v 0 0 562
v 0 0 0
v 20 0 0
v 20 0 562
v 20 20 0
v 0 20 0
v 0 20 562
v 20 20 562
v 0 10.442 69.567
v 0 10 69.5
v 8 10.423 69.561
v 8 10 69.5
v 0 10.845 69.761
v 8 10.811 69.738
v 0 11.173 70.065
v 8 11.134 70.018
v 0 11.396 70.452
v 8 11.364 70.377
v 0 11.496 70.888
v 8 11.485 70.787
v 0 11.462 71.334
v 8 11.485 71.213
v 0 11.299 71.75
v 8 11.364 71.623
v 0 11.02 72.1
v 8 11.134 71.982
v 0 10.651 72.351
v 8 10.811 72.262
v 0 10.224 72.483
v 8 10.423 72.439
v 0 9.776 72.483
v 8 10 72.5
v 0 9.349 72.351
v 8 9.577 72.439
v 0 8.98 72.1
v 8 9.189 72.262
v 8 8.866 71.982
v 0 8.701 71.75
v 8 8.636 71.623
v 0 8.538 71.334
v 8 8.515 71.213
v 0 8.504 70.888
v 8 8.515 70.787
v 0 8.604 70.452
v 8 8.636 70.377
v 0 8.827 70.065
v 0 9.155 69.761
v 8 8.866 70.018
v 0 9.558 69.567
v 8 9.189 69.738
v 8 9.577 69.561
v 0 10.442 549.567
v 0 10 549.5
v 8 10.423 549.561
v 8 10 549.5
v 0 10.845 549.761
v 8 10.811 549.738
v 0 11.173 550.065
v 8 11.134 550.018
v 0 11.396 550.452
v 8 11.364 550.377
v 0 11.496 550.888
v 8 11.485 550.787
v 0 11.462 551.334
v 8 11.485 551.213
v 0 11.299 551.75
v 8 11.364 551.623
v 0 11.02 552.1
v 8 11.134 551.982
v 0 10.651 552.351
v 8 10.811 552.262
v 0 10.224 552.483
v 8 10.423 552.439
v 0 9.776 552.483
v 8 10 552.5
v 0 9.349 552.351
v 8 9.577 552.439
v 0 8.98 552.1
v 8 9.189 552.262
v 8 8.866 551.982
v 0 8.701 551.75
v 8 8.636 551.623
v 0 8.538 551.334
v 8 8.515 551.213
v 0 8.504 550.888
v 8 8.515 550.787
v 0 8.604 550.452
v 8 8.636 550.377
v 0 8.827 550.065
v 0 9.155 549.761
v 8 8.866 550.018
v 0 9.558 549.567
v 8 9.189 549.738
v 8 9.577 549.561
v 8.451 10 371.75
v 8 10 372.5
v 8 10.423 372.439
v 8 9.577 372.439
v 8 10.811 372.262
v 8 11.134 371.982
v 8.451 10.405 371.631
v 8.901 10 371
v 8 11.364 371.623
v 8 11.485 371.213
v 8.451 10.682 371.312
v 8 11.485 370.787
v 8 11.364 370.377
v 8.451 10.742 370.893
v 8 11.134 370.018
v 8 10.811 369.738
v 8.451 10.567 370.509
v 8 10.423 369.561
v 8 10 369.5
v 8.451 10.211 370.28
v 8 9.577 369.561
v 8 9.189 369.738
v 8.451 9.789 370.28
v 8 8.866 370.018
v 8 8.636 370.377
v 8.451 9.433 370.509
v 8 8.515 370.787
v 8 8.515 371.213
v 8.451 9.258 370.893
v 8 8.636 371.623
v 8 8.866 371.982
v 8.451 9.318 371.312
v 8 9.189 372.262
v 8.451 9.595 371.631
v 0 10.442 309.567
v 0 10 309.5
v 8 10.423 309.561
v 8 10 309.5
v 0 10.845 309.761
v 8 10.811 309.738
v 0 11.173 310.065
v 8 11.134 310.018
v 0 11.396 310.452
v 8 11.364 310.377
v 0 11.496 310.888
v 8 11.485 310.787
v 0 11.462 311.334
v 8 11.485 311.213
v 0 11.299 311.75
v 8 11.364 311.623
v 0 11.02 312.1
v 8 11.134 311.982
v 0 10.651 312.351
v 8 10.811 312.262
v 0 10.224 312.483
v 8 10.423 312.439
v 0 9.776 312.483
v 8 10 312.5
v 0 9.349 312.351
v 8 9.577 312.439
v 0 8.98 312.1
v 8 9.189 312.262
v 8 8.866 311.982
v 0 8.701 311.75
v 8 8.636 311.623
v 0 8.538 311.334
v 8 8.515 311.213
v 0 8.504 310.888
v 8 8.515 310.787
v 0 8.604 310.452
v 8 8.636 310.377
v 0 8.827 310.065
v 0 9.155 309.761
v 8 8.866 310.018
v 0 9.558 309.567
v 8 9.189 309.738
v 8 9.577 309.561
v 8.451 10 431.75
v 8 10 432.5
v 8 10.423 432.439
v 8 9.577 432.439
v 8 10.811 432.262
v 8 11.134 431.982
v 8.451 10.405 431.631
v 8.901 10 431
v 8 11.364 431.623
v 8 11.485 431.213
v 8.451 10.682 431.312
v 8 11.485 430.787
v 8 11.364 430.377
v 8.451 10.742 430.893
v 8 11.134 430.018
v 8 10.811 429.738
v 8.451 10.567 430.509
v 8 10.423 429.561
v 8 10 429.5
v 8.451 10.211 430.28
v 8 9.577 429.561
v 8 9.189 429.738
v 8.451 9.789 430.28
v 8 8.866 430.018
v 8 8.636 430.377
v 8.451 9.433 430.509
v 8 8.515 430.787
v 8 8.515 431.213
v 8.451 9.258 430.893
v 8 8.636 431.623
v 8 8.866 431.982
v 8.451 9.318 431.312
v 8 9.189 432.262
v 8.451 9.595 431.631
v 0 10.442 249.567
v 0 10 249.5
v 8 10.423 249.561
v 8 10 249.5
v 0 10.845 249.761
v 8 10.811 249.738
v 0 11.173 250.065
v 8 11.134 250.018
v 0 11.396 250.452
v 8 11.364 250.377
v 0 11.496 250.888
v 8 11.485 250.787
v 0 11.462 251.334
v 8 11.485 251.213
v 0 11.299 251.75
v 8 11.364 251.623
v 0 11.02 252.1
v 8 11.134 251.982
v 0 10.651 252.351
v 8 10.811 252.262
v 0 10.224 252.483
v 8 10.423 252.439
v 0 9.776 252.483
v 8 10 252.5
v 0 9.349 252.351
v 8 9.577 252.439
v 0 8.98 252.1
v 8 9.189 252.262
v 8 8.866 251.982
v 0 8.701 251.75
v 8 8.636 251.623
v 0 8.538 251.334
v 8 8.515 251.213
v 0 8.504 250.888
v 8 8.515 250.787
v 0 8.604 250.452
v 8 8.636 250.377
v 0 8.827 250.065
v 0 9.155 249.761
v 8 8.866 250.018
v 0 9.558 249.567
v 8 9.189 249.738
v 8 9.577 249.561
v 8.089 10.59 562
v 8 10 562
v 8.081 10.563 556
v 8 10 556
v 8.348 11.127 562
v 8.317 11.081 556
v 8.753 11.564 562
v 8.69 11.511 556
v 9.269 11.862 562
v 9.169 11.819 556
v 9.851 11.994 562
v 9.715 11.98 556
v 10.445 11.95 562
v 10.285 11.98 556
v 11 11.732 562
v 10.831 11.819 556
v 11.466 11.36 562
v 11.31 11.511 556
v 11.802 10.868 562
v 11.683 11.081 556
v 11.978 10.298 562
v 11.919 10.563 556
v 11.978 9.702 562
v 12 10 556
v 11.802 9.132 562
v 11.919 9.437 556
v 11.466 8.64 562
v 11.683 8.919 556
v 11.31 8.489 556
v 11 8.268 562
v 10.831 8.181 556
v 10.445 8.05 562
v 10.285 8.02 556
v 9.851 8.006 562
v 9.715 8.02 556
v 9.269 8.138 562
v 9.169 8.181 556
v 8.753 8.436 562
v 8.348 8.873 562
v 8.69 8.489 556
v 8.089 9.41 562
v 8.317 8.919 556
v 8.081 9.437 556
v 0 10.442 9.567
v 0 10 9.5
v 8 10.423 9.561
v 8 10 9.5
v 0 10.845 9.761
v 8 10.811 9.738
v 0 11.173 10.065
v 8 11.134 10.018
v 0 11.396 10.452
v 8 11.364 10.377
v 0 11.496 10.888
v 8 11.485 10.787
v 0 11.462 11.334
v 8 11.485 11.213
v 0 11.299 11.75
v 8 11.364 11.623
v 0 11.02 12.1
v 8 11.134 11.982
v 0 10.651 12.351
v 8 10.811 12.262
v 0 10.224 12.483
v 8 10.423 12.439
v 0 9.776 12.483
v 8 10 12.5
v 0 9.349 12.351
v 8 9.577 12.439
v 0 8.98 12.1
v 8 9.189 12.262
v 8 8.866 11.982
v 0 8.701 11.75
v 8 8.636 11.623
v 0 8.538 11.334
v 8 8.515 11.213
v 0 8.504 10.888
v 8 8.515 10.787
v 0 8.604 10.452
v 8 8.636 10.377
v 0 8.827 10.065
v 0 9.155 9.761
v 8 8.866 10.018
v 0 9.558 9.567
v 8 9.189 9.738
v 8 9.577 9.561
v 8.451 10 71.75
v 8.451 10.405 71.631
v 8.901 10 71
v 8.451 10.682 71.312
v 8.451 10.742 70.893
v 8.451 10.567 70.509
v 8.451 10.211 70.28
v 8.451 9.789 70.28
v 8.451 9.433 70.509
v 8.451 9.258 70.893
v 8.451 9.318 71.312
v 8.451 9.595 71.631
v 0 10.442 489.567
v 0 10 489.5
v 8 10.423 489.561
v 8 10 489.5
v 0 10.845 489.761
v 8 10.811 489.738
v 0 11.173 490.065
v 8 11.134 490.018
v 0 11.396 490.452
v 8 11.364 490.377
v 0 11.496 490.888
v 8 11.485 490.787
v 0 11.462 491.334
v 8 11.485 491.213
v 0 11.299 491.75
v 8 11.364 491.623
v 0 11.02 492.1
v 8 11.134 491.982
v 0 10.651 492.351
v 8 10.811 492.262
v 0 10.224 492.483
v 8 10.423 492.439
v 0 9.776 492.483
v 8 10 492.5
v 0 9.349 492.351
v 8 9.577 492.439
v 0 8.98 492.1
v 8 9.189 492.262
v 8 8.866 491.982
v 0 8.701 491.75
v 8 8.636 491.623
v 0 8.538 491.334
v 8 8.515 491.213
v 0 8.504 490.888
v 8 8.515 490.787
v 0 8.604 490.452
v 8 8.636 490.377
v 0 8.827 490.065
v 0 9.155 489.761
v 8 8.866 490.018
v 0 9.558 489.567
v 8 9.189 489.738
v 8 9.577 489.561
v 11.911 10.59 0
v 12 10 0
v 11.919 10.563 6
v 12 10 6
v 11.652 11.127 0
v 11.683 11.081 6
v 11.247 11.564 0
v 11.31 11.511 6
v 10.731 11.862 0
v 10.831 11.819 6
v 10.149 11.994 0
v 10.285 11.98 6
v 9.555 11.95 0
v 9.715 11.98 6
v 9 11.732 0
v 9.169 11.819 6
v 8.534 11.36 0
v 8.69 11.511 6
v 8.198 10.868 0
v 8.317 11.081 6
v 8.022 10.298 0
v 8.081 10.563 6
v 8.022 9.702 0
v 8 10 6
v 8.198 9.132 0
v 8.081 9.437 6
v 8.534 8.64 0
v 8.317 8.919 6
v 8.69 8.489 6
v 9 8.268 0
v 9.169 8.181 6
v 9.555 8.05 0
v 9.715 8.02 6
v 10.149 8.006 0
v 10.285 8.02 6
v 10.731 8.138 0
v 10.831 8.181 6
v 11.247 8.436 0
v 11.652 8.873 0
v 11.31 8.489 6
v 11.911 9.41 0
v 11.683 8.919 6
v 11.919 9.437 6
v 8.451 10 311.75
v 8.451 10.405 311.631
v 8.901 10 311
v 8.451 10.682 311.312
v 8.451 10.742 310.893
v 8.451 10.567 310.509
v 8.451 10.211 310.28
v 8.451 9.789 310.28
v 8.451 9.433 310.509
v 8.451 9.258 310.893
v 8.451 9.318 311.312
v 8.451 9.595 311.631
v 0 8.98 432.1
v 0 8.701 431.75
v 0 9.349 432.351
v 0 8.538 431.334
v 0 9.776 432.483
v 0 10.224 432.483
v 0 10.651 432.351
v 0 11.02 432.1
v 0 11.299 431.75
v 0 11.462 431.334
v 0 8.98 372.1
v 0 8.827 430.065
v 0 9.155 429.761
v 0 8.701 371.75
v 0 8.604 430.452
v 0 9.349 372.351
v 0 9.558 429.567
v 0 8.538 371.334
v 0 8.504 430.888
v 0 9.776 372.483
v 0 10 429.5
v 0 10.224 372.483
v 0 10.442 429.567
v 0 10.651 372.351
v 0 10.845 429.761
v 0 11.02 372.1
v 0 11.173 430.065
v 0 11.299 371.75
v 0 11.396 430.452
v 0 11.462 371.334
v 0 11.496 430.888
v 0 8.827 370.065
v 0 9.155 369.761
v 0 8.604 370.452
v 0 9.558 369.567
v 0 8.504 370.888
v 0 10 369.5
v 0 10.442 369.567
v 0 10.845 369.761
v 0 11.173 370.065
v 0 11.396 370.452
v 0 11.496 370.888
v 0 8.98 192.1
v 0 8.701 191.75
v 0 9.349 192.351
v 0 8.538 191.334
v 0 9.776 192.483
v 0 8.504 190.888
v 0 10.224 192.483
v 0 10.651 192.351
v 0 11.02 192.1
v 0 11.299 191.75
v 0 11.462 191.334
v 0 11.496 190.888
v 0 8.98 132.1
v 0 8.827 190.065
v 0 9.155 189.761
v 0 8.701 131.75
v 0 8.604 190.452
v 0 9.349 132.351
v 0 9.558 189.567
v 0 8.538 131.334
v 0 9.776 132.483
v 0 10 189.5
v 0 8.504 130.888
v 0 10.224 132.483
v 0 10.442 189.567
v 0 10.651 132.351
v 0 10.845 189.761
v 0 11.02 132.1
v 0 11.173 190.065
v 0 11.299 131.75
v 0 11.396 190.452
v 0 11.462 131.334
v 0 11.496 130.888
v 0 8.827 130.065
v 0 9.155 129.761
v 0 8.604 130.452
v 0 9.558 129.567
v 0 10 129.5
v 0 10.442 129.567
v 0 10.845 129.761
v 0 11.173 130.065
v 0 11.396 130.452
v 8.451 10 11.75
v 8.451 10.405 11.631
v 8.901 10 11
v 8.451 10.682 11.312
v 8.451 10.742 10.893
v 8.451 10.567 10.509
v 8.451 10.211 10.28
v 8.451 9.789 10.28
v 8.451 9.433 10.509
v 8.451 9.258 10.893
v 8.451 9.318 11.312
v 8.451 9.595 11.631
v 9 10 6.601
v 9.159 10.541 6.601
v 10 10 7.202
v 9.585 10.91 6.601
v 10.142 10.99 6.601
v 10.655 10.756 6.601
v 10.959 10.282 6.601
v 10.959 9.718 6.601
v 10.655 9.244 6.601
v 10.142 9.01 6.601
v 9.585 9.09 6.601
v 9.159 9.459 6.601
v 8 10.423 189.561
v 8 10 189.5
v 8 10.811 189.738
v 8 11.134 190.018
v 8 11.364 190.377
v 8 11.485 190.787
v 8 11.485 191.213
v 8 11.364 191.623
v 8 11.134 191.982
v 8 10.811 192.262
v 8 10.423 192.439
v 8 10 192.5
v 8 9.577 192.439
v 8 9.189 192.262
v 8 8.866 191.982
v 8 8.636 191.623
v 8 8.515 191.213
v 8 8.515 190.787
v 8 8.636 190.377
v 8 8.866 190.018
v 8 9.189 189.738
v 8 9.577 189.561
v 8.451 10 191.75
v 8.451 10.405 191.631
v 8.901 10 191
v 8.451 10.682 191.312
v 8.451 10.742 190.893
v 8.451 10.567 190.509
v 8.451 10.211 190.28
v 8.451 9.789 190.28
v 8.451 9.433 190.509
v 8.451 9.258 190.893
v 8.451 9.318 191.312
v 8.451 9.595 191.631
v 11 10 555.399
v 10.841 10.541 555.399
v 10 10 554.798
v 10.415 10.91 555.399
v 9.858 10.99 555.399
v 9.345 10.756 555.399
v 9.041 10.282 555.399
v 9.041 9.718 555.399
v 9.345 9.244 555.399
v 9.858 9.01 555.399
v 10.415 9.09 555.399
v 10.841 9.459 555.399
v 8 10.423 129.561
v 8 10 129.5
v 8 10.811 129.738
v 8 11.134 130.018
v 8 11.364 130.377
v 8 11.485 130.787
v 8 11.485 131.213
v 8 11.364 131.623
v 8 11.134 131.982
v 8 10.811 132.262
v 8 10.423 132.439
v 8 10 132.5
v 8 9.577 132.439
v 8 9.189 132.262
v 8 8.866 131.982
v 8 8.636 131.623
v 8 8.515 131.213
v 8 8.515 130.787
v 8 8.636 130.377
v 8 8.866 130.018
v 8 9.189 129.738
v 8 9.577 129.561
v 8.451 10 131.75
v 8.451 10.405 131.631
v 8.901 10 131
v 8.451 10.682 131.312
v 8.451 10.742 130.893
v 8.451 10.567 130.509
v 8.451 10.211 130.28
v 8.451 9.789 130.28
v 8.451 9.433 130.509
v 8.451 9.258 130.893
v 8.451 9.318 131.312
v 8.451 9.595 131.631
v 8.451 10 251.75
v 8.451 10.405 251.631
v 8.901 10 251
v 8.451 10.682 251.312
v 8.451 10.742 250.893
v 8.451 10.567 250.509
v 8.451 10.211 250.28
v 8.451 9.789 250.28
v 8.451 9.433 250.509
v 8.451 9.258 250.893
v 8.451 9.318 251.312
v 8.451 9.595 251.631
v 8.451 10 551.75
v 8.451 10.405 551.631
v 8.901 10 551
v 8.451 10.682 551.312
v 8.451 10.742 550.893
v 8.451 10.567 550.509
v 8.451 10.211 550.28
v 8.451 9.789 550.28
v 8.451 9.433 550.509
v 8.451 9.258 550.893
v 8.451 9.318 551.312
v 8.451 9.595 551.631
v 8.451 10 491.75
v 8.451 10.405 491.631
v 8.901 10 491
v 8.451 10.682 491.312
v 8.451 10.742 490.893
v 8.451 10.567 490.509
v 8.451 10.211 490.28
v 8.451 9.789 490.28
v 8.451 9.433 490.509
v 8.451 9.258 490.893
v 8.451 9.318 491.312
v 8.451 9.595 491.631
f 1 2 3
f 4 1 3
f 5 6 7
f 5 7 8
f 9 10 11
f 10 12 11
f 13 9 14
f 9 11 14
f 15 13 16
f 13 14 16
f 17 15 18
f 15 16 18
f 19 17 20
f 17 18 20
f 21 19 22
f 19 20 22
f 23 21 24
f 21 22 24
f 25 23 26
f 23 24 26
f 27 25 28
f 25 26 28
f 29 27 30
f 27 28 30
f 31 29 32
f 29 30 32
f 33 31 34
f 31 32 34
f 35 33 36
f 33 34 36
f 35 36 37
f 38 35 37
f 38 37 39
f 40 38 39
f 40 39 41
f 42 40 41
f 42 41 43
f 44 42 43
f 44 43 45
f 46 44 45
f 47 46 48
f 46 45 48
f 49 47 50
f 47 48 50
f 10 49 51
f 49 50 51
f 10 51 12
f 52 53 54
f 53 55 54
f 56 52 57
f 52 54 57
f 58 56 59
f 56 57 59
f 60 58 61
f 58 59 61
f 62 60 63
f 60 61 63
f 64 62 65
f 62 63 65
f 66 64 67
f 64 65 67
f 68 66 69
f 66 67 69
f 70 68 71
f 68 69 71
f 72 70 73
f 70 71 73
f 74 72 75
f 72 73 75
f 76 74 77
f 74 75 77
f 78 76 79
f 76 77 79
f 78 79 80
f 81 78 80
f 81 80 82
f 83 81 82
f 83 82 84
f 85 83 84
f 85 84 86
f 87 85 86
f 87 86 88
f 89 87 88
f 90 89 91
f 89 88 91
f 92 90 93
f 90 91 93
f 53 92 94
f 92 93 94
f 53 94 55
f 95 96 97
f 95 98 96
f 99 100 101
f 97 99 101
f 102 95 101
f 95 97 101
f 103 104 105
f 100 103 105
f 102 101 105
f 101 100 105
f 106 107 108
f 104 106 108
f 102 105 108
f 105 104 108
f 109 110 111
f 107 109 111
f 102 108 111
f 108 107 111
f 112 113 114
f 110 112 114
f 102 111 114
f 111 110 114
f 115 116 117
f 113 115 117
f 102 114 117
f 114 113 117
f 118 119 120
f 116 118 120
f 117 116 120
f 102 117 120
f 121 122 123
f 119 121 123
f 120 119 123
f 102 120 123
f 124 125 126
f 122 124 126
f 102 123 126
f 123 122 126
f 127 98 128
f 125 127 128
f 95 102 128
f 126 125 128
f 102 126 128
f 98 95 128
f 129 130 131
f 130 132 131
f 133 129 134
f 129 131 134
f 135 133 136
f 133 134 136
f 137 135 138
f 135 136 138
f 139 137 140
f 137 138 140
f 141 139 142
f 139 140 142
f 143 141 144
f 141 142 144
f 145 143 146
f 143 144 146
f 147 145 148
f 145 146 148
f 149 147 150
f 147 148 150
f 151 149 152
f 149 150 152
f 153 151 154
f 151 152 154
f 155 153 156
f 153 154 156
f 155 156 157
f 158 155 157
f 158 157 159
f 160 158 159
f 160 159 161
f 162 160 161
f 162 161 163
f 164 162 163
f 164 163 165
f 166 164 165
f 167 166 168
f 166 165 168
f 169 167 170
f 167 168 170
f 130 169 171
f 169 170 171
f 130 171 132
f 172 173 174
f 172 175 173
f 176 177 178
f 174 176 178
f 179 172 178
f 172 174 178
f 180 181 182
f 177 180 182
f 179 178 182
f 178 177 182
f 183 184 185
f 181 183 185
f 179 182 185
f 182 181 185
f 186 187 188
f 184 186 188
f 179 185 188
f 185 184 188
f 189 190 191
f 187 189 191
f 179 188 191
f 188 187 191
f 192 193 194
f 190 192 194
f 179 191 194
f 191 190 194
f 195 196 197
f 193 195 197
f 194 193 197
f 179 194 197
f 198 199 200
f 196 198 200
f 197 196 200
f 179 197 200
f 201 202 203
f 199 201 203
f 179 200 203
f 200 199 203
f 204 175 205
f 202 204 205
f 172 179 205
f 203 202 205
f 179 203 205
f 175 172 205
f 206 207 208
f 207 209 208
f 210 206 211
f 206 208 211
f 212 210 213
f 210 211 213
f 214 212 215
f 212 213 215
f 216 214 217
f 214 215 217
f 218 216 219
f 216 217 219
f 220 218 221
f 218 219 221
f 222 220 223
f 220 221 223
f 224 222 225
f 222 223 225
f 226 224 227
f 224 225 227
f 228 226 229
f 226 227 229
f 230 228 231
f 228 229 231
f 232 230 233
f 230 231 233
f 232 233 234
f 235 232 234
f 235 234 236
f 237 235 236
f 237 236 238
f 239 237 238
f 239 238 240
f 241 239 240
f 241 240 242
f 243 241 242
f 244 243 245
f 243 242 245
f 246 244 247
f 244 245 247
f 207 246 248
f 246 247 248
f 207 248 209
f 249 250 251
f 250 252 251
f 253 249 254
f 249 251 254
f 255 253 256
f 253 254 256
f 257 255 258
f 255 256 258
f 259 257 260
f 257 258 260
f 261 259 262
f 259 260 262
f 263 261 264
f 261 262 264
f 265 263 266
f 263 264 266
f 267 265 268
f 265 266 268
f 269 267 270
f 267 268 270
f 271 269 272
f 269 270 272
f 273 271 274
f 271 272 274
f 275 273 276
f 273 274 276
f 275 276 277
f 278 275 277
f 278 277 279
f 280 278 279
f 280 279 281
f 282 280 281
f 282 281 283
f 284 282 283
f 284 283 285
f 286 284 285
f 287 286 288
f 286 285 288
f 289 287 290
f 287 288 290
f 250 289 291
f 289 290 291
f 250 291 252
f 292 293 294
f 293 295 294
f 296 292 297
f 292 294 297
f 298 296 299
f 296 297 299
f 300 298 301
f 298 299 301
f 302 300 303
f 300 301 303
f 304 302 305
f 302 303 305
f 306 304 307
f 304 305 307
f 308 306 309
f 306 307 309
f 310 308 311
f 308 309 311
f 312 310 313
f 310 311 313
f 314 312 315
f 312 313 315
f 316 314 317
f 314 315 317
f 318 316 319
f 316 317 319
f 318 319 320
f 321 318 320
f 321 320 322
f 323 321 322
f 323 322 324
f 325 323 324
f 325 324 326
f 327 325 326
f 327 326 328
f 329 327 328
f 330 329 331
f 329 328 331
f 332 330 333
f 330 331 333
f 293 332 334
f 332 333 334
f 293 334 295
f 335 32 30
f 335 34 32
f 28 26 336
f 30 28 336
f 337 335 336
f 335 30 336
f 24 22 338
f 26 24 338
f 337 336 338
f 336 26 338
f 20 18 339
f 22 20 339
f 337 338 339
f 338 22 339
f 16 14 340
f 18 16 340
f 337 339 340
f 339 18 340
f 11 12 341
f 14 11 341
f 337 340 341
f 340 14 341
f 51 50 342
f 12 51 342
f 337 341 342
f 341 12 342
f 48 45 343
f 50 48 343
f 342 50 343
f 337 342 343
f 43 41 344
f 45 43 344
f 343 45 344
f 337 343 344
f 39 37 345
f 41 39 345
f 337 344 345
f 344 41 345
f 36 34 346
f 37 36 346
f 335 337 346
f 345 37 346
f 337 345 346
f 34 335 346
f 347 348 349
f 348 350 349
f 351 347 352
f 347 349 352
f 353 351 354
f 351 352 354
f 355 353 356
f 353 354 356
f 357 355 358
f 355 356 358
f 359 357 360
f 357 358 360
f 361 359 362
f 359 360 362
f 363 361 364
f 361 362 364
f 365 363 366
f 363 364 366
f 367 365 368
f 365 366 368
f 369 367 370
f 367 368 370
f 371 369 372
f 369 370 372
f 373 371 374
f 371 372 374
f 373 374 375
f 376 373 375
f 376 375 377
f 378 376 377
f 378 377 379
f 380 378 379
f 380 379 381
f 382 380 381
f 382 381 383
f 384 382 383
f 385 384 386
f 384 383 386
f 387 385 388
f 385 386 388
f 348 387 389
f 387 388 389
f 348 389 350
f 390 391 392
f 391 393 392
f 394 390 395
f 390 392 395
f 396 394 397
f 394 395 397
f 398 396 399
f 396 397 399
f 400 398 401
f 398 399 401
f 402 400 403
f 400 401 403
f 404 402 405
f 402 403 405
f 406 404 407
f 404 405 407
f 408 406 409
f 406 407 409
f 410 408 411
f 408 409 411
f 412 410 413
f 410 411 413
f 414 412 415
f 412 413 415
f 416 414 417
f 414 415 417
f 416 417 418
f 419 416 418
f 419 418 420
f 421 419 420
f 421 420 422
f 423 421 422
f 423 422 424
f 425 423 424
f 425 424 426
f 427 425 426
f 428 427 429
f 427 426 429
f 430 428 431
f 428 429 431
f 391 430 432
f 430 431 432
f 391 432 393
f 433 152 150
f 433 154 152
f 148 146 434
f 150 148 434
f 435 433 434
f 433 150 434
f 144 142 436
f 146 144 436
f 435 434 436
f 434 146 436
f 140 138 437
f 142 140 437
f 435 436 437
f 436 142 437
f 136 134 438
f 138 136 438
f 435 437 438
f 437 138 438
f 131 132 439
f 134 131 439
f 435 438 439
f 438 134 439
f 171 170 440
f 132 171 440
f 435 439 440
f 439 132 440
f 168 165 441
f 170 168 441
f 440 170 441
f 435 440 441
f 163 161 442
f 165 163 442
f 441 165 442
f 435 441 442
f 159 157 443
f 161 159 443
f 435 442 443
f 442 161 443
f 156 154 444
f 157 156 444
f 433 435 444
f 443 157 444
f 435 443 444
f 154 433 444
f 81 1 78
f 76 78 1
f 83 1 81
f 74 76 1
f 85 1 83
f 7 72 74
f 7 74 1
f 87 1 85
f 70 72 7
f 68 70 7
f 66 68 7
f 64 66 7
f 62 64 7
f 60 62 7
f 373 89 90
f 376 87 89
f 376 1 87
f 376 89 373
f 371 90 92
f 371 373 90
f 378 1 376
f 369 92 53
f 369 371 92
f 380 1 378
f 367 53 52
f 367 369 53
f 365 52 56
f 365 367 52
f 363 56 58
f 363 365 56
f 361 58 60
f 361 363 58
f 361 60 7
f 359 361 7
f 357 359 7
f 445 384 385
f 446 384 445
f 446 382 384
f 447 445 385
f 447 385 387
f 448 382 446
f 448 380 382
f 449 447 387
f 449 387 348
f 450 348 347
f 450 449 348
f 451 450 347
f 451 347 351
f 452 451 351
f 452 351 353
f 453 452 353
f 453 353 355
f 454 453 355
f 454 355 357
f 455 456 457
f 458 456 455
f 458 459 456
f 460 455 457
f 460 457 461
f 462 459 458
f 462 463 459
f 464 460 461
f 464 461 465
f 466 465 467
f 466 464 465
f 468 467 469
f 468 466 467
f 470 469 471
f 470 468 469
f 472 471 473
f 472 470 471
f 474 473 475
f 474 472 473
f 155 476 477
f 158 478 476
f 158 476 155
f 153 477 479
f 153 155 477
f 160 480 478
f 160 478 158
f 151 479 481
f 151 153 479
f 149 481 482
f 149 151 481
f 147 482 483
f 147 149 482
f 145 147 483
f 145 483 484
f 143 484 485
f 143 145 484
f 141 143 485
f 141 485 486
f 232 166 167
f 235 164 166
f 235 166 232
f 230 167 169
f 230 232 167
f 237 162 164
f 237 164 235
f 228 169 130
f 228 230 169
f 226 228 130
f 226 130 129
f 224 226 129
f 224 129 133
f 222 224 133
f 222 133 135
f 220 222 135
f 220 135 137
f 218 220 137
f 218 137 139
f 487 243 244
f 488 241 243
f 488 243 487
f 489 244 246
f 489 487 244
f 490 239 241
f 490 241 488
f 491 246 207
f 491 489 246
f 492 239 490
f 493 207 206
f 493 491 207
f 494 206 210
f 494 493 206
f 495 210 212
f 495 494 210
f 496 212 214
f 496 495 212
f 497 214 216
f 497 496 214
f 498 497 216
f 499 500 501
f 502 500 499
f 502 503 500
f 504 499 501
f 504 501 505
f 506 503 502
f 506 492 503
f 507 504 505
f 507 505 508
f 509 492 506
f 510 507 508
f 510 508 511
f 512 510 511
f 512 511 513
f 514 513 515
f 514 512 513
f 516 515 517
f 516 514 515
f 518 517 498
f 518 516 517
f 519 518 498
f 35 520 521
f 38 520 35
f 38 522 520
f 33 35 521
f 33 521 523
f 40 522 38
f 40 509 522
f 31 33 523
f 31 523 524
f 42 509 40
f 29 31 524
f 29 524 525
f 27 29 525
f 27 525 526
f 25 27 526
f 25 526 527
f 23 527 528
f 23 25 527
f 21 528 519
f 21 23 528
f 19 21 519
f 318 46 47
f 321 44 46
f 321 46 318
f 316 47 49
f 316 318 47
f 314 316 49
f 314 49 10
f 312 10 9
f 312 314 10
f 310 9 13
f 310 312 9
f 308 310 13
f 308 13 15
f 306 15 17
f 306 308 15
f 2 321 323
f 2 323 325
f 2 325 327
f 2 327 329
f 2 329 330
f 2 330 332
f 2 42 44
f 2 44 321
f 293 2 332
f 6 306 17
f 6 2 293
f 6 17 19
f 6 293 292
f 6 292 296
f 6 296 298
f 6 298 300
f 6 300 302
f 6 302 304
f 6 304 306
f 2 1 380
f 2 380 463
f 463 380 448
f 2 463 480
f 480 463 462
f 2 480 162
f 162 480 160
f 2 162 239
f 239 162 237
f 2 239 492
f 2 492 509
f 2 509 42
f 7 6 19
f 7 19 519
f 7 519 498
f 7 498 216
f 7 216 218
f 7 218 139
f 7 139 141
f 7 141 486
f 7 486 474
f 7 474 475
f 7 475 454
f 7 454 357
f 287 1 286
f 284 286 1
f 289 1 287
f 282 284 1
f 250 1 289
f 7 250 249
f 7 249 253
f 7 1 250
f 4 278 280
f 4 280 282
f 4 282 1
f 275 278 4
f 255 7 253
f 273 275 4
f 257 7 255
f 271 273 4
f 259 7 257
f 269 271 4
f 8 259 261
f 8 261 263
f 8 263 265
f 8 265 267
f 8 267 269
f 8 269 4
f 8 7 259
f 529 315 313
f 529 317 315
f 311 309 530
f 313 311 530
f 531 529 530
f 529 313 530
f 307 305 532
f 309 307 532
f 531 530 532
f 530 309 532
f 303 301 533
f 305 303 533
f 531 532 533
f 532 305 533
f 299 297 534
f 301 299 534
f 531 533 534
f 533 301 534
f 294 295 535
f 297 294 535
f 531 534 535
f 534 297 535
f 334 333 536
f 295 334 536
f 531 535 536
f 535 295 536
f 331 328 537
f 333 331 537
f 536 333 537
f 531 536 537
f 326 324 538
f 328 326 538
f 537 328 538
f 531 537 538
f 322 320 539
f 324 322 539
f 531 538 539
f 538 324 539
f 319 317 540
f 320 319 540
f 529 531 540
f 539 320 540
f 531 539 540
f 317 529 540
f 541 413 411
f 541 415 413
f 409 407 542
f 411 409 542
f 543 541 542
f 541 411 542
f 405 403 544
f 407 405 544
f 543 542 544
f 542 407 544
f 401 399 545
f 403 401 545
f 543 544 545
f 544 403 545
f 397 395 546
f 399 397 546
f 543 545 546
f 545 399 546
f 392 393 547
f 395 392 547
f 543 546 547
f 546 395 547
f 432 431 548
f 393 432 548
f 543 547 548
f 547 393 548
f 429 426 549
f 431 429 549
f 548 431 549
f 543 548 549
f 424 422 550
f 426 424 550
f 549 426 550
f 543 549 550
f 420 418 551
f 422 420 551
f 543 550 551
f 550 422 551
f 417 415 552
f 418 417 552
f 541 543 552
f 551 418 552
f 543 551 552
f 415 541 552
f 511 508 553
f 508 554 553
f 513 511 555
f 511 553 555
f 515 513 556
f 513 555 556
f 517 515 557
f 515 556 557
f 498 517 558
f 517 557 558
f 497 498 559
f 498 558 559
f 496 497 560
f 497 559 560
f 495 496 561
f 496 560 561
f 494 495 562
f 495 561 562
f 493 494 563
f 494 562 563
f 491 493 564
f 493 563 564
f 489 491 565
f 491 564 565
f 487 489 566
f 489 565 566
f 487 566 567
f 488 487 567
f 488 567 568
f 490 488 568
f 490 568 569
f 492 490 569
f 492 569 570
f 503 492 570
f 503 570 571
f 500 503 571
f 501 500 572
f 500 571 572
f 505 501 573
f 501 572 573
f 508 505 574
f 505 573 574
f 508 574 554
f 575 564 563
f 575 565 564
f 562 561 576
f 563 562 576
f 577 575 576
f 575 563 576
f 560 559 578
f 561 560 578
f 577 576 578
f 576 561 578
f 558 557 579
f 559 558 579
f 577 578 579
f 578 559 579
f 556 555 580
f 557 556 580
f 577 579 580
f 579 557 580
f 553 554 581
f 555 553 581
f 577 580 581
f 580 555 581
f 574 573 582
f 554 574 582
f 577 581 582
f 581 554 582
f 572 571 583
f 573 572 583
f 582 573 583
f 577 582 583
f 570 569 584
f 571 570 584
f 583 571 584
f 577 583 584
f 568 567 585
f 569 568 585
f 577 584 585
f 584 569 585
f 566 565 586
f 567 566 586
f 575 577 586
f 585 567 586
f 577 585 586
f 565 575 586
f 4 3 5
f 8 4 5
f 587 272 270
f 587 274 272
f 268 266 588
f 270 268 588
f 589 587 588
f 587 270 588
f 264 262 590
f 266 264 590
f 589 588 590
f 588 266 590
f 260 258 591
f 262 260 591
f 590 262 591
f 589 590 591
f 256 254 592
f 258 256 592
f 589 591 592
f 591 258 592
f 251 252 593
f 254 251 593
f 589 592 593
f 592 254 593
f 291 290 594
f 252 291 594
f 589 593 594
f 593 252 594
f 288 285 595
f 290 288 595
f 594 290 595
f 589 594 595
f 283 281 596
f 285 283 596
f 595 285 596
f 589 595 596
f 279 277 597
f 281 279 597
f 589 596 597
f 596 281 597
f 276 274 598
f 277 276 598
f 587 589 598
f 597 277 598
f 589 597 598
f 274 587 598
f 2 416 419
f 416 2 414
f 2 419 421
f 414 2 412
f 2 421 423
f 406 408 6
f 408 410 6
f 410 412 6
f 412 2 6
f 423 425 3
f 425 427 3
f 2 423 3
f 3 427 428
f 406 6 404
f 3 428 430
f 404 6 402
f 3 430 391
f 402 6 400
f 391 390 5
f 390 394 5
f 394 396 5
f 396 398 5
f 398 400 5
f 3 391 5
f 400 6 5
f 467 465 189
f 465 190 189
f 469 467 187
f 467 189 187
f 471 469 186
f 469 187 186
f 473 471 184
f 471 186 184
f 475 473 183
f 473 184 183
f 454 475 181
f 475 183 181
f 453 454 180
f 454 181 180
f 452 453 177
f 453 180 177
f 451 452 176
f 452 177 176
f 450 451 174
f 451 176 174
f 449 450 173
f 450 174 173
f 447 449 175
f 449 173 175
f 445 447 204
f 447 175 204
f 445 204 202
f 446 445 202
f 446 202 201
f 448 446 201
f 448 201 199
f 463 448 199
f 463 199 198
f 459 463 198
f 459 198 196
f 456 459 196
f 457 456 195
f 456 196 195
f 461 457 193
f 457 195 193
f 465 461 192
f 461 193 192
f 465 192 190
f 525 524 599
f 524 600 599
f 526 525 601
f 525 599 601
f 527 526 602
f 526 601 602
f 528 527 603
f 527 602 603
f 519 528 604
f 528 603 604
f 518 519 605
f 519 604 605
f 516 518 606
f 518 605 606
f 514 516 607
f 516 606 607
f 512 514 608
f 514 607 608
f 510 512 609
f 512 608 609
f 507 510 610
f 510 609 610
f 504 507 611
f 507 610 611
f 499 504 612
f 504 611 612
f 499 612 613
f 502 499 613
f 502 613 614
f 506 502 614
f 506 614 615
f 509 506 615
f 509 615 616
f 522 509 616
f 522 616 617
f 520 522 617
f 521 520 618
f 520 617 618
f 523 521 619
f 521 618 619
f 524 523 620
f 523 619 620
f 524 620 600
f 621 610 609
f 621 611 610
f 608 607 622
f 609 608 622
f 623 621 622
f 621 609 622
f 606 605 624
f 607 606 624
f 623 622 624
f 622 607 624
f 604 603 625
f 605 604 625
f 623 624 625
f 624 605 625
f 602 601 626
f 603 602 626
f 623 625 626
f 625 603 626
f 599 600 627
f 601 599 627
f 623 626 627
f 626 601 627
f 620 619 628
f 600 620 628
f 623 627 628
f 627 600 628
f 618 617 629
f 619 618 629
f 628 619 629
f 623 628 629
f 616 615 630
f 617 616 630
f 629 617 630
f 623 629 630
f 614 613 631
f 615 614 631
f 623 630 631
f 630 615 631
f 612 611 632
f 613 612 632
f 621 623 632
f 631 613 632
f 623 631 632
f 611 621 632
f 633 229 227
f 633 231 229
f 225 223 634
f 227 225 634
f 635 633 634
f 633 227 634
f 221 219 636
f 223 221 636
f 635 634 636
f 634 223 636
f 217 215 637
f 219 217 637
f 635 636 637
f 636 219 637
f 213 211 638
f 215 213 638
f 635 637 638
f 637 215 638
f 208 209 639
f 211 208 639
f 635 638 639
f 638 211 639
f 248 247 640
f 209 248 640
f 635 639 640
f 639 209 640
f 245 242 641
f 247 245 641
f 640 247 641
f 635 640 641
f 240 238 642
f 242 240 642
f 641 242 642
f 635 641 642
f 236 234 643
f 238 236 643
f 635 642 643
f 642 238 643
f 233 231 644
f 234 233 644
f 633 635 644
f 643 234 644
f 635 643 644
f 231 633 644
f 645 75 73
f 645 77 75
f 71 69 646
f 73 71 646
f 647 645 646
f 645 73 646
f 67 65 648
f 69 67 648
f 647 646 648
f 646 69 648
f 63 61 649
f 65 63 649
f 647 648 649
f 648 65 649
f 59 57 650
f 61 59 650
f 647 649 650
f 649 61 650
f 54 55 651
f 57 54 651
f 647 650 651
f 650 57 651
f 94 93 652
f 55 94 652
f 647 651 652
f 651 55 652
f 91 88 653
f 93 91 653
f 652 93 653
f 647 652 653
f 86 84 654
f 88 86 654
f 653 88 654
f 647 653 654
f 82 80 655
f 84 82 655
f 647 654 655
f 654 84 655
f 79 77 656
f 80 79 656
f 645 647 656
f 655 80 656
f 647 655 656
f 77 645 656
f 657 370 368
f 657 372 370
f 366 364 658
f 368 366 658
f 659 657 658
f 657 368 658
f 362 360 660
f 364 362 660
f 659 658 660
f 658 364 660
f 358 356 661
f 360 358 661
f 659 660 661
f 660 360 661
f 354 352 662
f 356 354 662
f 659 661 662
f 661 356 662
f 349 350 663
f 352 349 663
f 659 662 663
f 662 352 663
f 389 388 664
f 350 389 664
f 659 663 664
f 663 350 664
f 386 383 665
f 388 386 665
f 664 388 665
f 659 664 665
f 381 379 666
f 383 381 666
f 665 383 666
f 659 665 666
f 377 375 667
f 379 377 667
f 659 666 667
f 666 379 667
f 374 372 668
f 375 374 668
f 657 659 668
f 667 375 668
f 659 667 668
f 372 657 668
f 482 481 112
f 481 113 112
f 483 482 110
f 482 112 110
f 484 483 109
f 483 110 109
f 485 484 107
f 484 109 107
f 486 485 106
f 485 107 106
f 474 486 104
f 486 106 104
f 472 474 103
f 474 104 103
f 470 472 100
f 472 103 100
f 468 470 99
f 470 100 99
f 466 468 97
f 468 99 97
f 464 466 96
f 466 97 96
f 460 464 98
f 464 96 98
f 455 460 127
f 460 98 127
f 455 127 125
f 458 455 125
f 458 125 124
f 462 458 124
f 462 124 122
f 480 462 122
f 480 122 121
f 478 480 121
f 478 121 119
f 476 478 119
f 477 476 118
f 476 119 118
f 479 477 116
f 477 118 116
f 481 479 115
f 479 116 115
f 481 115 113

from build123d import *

# Parameters (mm, degrees)
SKETCH1_W                 = 20
SKETCH1_H                 = 20
BOSS_EXTRUDE1_DEPTH       = 562
F_3_0MM_DOWEL_HOLE1_D     = 3
F_3_0MM_DOWEL_HOLE1_DEPTH = 8
F_3_0MM_DOWEL_HOLE1_TIP   = 0.901290929
F_4_0MM_DOWEL_HOLE1_D     = 4
F_4_0MM_DOWEL_HOLE1_DEPTH = 6
F_4_0MM_DOWEL_HOLE1_TIP   = 1.201721238
F_4_0MM_DOWEL_HOLE2_D     = 4
F_4_0MM_DOWEL_HOLE2_DEPTH = 6
F_4_0MM_DOWEL_HOLE2_TIP   = 1.201721238


with BuildPart() as part:
    # Sketch1 → Boss-Extrude1 (new body)
    with BuildSketch(Plane.XY):
        with Locations((10, 10)):
            Rectangle(SKETCH1_W, SKETCH1_H)
    extrude(amount=BOSS_EXTRUDE1_DEPTH)

    # Ø3.0mm Dowel Hole1
    with Locations(Plane.ZY):
        with Locations((551, 10), (491, 10), (431, 10), (371, 10), (311, 10), (251, 10), (191, 10), (131, 10), (71, 10), (11, 10)):
            Hole(F_3_0MM_DOWEL_HOLE1_D / 2, depth=F_3_0MM_DOWEL_HOLE1_DEPTH)
            with Locations((0, 0, -(F_3_0MM_DOWEL_HOLE1_DEPTH + F_3_0MM_DOWEL_HOLE1_TIP / 2))):  # 118° drill point
                Cone(0, F_3_0MM_DOWEL_HOLE1_D / 2, F_3_0MM_DOWEL_HOLE1_TIP, mode=Mode.SUBTRACT)

    # Ø4.0mm Dowel Hole1
    with Locations(Plane.XY.offset(562)):
        with Locations((10, 10)):
            Hole(F_4_0MM_DOWEL_HOLE1_D / 2, depth=F_4_0MM_DOWEL_HOLE1_DEPTH)
            with Locations((0, 0, -(F_4_0MM_DOWEL_HOLE1_DEPTH + F_4_0MM_DOWEL_HOLE1_TIP / 2))):  # 118° drill point
                Cone(0, F_4_0MM_DOWEL_HOLE1_D / 2, F_4_0MM_DOWEL_HOLE1_TIP, mode=Mode.SUBTRACT)

    # Ø4.0mm Dowel Hole2
    with Locations(Plane(origin=(0, 0, 0), x_dir=(-1, 0, 0), z_dir=(0, 0, -1))):
        with Locations((-10, 10)):
            Hole(F_4_0MM_DOWEL_HOLE2_D / 2, depth=F_4_0MM_DOWEL_HOLE2_DEPTH)
            with Locations((0, 0, -(F_4_0MM_DOWEL_HOLE2_DEPTH + F_4_0MM_DOWEL_HOLE2_TIP / 2))):  # 118° drill point
                Cone(0, F_4_0MM_DOWEL_HOLE2_D / 2, F_4_0MM_DOWEL_HOLE2_TIP, mode=Mode.SUBTRACT)


solid = part.part
